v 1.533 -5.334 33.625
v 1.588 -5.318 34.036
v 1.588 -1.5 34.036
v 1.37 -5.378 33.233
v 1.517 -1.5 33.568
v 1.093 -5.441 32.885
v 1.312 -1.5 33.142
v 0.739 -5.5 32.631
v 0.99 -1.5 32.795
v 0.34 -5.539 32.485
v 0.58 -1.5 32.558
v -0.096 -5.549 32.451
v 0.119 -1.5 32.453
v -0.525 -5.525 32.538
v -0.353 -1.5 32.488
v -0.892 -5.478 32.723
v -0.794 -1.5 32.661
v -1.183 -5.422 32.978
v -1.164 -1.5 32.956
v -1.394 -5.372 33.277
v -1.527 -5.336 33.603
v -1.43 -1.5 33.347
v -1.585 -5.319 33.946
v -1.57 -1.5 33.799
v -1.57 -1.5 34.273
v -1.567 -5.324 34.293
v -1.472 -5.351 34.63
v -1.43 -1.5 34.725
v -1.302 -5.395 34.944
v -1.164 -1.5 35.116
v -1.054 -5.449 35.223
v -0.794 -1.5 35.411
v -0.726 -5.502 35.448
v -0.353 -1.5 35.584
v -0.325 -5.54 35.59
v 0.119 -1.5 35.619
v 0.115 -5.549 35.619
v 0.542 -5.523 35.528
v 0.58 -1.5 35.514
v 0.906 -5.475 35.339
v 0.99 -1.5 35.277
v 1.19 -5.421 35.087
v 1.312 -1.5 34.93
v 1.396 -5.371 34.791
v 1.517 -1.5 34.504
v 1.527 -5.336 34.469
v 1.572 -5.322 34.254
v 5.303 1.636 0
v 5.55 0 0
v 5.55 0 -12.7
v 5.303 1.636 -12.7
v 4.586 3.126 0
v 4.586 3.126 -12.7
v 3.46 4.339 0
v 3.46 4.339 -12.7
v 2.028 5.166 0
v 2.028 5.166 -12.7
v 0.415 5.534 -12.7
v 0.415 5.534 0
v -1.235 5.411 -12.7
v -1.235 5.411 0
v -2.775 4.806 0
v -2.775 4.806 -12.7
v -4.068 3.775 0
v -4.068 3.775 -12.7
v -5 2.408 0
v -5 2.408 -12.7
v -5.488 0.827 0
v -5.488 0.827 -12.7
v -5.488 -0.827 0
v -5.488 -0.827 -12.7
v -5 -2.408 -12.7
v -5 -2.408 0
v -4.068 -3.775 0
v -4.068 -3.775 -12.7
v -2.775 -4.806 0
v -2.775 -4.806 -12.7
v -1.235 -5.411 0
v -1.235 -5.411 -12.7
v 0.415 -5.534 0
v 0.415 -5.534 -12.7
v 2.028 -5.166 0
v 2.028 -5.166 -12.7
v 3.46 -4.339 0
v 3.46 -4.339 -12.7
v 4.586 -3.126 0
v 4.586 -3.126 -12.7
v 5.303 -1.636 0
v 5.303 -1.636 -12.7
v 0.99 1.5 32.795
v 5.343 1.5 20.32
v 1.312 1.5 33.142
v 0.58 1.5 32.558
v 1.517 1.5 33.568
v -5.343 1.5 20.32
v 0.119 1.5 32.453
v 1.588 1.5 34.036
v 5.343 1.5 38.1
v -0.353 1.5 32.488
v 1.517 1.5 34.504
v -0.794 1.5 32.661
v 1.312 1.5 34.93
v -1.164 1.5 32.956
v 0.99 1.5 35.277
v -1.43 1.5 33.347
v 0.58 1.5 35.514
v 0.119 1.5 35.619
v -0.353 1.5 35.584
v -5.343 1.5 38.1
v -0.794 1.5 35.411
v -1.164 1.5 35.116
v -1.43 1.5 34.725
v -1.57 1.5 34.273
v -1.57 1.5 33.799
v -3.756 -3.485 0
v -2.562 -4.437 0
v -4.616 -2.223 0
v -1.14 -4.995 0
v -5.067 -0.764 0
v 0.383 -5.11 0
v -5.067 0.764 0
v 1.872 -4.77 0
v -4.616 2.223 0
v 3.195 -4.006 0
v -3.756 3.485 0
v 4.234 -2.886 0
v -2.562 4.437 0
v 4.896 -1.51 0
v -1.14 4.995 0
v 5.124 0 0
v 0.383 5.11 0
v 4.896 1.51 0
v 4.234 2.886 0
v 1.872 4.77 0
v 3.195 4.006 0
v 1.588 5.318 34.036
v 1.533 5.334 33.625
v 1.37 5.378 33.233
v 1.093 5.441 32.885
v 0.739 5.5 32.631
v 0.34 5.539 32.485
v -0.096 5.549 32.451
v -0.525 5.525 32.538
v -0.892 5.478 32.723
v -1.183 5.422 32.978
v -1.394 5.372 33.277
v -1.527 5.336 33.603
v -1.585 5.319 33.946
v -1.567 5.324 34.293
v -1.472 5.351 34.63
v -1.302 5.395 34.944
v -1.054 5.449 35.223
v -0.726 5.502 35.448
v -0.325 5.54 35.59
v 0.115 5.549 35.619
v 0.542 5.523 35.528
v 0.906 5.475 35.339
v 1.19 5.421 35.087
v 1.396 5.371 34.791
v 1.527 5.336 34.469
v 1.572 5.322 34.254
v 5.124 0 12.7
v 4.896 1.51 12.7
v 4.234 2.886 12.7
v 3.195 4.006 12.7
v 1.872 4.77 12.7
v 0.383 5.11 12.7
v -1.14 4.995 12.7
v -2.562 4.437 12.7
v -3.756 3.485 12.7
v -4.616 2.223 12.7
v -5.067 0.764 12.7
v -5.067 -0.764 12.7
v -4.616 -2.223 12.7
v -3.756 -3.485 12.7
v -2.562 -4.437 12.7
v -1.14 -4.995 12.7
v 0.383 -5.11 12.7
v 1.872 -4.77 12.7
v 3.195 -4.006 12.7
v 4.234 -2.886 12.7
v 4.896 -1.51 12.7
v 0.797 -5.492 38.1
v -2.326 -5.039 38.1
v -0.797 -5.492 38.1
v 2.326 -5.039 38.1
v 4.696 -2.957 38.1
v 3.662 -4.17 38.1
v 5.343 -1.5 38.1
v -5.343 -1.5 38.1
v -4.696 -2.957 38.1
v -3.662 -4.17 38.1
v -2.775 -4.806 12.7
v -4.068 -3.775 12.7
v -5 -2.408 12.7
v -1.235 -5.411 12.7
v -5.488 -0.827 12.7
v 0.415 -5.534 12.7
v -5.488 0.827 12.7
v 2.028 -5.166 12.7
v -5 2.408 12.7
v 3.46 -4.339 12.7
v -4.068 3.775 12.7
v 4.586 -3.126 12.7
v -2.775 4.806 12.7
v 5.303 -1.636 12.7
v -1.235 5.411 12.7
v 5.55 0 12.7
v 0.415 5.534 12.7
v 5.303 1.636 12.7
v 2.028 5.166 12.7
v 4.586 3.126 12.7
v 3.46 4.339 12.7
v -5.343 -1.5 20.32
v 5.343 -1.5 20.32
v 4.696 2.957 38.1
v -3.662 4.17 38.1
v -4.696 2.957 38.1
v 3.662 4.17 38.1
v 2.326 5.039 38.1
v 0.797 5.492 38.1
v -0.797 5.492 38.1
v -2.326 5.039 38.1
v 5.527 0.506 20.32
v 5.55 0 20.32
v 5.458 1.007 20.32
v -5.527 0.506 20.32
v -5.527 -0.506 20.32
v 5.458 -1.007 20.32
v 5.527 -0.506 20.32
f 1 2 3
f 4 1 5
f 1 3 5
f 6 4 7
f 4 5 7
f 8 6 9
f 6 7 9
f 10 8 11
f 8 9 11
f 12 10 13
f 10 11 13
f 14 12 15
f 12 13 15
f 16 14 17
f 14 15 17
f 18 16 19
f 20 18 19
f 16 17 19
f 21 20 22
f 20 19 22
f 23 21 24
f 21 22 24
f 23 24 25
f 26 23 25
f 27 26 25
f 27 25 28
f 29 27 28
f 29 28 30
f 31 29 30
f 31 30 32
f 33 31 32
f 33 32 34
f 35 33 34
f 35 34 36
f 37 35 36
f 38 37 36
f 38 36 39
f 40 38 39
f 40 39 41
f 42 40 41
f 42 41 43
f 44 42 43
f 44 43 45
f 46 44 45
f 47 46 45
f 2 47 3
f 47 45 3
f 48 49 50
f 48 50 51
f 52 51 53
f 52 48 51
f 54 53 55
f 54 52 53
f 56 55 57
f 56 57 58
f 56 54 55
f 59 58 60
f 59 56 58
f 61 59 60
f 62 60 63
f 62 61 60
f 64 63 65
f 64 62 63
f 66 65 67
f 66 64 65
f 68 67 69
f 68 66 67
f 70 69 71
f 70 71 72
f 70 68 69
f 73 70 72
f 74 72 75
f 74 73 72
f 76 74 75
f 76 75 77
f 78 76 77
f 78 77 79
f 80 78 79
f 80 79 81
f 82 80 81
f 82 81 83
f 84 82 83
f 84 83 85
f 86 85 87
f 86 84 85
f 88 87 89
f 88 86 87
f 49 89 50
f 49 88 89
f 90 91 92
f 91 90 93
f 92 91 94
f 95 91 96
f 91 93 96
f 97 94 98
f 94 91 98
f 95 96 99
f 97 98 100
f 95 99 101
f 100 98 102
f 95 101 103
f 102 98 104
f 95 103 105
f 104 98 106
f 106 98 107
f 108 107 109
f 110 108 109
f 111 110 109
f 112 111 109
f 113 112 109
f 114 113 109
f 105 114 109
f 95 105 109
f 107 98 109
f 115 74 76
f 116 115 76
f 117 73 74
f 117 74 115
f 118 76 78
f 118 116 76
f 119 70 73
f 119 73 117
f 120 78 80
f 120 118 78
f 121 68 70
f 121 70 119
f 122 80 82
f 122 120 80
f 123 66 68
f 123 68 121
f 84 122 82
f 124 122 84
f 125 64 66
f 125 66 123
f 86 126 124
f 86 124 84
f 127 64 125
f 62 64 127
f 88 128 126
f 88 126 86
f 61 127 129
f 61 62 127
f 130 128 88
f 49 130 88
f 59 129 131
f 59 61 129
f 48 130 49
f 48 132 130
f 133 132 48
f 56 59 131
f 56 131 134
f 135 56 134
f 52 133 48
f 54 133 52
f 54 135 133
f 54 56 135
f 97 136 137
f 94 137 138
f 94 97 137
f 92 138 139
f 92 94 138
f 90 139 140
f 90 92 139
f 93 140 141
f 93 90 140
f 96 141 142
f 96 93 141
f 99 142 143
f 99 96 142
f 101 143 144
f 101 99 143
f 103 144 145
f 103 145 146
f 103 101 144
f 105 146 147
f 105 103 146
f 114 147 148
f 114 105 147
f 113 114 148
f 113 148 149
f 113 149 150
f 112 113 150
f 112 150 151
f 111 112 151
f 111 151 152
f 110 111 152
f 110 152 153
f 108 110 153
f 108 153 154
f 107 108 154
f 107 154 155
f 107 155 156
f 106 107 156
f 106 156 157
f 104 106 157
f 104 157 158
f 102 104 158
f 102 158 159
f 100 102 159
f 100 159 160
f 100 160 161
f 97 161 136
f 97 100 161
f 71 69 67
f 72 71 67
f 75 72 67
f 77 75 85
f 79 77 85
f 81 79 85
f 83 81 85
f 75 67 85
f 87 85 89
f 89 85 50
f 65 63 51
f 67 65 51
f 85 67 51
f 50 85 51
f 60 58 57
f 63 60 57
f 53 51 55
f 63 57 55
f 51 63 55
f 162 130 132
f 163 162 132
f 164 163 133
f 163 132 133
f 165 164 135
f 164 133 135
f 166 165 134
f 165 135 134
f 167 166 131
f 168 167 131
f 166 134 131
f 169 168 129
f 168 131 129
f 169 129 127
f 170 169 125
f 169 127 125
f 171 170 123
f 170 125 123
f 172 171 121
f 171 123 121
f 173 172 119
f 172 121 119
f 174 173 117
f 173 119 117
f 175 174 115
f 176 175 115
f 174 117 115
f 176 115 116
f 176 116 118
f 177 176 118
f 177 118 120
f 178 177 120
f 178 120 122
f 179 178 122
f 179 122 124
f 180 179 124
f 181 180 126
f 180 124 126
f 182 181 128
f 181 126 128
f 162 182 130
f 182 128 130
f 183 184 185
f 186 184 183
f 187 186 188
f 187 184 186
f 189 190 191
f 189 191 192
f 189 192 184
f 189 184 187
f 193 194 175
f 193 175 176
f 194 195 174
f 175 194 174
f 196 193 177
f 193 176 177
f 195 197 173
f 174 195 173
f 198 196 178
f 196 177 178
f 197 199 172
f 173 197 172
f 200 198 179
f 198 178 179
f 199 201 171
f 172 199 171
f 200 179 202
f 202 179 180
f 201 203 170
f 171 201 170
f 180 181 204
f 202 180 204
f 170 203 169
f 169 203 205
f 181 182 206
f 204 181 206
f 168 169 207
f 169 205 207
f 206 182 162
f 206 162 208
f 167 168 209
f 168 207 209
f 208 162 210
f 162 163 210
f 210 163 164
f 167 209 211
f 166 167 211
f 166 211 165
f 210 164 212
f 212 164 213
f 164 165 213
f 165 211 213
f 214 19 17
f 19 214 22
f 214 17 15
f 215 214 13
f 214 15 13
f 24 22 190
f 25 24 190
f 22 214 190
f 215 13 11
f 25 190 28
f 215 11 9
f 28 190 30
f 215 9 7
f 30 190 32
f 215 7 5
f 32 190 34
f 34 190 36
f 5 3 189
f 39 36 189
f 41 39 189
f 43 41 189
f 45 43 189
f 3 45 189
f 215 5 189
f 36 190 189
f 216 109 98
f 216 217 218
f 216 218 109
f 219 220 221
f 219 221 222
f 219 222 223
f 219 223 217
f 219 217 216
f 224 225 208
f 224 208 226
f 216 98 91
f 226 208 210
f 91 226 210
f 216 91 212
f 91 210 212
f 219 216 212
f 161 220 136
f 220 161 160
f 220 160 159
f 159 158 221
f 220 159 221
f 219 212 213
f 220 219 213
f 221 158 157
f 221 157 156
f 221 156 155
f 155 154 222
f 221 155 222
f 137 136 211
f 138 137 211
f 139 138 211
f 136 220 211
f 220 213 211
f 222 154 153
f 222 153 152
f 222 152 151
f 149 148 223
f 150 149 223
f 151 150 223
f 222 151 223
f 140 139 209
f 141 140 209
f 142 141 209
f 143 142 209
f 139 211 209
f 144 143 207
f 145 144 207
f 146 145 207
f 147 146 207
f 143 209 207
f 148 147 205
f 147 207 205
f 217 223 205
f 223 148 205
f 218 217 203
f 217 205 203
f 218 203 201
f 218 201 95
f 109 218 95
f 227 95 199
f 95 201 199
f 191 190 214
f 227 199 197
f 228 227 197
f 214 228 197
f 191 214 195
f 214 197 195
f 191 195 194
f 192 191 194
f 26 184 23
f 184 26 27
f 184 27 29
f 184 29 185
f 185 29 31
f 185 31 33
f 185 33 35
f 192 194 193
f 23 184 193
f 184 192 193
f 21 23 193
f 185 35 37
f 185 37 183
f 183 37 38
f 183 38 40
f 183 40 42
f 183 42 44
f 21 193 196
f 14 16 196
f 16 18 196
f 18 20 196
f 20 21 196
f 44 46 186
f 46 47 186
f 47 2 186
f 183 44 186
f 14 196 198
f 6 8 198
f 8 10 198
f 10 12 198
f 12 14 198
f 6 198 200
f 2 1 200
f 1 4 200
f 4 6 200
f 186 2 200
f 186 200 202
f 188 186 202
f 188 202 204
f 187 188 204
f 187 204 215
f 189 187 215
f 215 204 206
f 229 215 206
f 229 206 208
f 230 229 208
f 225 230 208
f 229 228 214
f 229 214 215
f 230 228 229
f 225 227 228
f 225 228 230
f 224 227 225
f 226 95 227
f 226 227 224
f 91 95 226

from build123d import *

# Parameters (mm, degrees)
SKETCH1_R               = 5.5499
BOSS_EXTRUDE1_DEPTH     = 38.1
CUT_EXTRUDE1_DEPTH      = 17.78
SKETCH3_R               = 1.5875
CUT_EXTRUDE2_DEPTH      = 8.0499
CUT_EXTRUDE2_DEPTH_BACK = 5.0499
SKETCH4_R               = 5.5499
BOSS_EXTRUDE4_DEPTH     = 12.7
SKETCH6_R               = 5.5499
SKETCH6_R_2             = 5.12385248
CUT_EXTRUDE4_DEPTH      = 12.7


with BuildPart() as part:
    # Sketch1 → Boss-Extrude1 (new body)
    with BuildSketch(Plane.XY):
        Circle(SKETCH1_R)
    extrude(amount=BOSS_EXTRUDE1_DEPTH)

    # Sketch2 → Cut-Extrude1 (cut)
    with BuildSketch(Plane.XY.offset(38.1)):
        with BuildLine():
            Line((5.343350074, 1.5), (-5.343350074, 1.5))
            ThreePointArc((-5.343350074, 1.5), (-5.5499, 0), (-5.343350074, -1.5))
            Line((-5.343350074, -1.5), (5.343350074, -1.5))
            ThreePointArc((5.343350074, -1.5), (5.5499, 0), (5.343350074, 1.5))
        make_face()
    extrude(amount=-CUT_EXTRUDE1_DEPTH, mode=Mode.SUBTRACT)

    # Sketch3 → Cut-Extrude2 (cut, two sides)
    with BuildSketch(Plane(origin=(0, -1.5, 0), x_dir=(1, 0, 0), z_dir=(0, 1, 0))) as cut_extrude2_sk:
        with Locations((0, -34.036)):
            Circle(SKETCH3_R)
    extrude(amount=CUT_EXTRUDE2_DEPTH, mode=Mode.SUBTRACT)
    extrude(cut_extrude2_sk.sketch, amount=-CUT_EXTRUDE2_DEPTH_BACK, mode=Mode.SUBTRACT)

    # Sketch4 → Boss-Extrude4 (add)
    with BuildSketch(Plane.XY):
        Circle(SKETCH4_R)
    extrude(amount=-BOSS_EXTRUDE4_DEPTH)

    # Sketch6 → Cut-Extrude4 (cut)
    with BuildSketch(Plane.XY):
        Circle(SKETCH6_R)
        Circle(SKETCH6_R_2, mode=Mode.SUBTRACT)
    extrude(amount=CUT_EXTRUDE4_DEPTH, mode=Mode.SUBTRACT)


solid = part.part
